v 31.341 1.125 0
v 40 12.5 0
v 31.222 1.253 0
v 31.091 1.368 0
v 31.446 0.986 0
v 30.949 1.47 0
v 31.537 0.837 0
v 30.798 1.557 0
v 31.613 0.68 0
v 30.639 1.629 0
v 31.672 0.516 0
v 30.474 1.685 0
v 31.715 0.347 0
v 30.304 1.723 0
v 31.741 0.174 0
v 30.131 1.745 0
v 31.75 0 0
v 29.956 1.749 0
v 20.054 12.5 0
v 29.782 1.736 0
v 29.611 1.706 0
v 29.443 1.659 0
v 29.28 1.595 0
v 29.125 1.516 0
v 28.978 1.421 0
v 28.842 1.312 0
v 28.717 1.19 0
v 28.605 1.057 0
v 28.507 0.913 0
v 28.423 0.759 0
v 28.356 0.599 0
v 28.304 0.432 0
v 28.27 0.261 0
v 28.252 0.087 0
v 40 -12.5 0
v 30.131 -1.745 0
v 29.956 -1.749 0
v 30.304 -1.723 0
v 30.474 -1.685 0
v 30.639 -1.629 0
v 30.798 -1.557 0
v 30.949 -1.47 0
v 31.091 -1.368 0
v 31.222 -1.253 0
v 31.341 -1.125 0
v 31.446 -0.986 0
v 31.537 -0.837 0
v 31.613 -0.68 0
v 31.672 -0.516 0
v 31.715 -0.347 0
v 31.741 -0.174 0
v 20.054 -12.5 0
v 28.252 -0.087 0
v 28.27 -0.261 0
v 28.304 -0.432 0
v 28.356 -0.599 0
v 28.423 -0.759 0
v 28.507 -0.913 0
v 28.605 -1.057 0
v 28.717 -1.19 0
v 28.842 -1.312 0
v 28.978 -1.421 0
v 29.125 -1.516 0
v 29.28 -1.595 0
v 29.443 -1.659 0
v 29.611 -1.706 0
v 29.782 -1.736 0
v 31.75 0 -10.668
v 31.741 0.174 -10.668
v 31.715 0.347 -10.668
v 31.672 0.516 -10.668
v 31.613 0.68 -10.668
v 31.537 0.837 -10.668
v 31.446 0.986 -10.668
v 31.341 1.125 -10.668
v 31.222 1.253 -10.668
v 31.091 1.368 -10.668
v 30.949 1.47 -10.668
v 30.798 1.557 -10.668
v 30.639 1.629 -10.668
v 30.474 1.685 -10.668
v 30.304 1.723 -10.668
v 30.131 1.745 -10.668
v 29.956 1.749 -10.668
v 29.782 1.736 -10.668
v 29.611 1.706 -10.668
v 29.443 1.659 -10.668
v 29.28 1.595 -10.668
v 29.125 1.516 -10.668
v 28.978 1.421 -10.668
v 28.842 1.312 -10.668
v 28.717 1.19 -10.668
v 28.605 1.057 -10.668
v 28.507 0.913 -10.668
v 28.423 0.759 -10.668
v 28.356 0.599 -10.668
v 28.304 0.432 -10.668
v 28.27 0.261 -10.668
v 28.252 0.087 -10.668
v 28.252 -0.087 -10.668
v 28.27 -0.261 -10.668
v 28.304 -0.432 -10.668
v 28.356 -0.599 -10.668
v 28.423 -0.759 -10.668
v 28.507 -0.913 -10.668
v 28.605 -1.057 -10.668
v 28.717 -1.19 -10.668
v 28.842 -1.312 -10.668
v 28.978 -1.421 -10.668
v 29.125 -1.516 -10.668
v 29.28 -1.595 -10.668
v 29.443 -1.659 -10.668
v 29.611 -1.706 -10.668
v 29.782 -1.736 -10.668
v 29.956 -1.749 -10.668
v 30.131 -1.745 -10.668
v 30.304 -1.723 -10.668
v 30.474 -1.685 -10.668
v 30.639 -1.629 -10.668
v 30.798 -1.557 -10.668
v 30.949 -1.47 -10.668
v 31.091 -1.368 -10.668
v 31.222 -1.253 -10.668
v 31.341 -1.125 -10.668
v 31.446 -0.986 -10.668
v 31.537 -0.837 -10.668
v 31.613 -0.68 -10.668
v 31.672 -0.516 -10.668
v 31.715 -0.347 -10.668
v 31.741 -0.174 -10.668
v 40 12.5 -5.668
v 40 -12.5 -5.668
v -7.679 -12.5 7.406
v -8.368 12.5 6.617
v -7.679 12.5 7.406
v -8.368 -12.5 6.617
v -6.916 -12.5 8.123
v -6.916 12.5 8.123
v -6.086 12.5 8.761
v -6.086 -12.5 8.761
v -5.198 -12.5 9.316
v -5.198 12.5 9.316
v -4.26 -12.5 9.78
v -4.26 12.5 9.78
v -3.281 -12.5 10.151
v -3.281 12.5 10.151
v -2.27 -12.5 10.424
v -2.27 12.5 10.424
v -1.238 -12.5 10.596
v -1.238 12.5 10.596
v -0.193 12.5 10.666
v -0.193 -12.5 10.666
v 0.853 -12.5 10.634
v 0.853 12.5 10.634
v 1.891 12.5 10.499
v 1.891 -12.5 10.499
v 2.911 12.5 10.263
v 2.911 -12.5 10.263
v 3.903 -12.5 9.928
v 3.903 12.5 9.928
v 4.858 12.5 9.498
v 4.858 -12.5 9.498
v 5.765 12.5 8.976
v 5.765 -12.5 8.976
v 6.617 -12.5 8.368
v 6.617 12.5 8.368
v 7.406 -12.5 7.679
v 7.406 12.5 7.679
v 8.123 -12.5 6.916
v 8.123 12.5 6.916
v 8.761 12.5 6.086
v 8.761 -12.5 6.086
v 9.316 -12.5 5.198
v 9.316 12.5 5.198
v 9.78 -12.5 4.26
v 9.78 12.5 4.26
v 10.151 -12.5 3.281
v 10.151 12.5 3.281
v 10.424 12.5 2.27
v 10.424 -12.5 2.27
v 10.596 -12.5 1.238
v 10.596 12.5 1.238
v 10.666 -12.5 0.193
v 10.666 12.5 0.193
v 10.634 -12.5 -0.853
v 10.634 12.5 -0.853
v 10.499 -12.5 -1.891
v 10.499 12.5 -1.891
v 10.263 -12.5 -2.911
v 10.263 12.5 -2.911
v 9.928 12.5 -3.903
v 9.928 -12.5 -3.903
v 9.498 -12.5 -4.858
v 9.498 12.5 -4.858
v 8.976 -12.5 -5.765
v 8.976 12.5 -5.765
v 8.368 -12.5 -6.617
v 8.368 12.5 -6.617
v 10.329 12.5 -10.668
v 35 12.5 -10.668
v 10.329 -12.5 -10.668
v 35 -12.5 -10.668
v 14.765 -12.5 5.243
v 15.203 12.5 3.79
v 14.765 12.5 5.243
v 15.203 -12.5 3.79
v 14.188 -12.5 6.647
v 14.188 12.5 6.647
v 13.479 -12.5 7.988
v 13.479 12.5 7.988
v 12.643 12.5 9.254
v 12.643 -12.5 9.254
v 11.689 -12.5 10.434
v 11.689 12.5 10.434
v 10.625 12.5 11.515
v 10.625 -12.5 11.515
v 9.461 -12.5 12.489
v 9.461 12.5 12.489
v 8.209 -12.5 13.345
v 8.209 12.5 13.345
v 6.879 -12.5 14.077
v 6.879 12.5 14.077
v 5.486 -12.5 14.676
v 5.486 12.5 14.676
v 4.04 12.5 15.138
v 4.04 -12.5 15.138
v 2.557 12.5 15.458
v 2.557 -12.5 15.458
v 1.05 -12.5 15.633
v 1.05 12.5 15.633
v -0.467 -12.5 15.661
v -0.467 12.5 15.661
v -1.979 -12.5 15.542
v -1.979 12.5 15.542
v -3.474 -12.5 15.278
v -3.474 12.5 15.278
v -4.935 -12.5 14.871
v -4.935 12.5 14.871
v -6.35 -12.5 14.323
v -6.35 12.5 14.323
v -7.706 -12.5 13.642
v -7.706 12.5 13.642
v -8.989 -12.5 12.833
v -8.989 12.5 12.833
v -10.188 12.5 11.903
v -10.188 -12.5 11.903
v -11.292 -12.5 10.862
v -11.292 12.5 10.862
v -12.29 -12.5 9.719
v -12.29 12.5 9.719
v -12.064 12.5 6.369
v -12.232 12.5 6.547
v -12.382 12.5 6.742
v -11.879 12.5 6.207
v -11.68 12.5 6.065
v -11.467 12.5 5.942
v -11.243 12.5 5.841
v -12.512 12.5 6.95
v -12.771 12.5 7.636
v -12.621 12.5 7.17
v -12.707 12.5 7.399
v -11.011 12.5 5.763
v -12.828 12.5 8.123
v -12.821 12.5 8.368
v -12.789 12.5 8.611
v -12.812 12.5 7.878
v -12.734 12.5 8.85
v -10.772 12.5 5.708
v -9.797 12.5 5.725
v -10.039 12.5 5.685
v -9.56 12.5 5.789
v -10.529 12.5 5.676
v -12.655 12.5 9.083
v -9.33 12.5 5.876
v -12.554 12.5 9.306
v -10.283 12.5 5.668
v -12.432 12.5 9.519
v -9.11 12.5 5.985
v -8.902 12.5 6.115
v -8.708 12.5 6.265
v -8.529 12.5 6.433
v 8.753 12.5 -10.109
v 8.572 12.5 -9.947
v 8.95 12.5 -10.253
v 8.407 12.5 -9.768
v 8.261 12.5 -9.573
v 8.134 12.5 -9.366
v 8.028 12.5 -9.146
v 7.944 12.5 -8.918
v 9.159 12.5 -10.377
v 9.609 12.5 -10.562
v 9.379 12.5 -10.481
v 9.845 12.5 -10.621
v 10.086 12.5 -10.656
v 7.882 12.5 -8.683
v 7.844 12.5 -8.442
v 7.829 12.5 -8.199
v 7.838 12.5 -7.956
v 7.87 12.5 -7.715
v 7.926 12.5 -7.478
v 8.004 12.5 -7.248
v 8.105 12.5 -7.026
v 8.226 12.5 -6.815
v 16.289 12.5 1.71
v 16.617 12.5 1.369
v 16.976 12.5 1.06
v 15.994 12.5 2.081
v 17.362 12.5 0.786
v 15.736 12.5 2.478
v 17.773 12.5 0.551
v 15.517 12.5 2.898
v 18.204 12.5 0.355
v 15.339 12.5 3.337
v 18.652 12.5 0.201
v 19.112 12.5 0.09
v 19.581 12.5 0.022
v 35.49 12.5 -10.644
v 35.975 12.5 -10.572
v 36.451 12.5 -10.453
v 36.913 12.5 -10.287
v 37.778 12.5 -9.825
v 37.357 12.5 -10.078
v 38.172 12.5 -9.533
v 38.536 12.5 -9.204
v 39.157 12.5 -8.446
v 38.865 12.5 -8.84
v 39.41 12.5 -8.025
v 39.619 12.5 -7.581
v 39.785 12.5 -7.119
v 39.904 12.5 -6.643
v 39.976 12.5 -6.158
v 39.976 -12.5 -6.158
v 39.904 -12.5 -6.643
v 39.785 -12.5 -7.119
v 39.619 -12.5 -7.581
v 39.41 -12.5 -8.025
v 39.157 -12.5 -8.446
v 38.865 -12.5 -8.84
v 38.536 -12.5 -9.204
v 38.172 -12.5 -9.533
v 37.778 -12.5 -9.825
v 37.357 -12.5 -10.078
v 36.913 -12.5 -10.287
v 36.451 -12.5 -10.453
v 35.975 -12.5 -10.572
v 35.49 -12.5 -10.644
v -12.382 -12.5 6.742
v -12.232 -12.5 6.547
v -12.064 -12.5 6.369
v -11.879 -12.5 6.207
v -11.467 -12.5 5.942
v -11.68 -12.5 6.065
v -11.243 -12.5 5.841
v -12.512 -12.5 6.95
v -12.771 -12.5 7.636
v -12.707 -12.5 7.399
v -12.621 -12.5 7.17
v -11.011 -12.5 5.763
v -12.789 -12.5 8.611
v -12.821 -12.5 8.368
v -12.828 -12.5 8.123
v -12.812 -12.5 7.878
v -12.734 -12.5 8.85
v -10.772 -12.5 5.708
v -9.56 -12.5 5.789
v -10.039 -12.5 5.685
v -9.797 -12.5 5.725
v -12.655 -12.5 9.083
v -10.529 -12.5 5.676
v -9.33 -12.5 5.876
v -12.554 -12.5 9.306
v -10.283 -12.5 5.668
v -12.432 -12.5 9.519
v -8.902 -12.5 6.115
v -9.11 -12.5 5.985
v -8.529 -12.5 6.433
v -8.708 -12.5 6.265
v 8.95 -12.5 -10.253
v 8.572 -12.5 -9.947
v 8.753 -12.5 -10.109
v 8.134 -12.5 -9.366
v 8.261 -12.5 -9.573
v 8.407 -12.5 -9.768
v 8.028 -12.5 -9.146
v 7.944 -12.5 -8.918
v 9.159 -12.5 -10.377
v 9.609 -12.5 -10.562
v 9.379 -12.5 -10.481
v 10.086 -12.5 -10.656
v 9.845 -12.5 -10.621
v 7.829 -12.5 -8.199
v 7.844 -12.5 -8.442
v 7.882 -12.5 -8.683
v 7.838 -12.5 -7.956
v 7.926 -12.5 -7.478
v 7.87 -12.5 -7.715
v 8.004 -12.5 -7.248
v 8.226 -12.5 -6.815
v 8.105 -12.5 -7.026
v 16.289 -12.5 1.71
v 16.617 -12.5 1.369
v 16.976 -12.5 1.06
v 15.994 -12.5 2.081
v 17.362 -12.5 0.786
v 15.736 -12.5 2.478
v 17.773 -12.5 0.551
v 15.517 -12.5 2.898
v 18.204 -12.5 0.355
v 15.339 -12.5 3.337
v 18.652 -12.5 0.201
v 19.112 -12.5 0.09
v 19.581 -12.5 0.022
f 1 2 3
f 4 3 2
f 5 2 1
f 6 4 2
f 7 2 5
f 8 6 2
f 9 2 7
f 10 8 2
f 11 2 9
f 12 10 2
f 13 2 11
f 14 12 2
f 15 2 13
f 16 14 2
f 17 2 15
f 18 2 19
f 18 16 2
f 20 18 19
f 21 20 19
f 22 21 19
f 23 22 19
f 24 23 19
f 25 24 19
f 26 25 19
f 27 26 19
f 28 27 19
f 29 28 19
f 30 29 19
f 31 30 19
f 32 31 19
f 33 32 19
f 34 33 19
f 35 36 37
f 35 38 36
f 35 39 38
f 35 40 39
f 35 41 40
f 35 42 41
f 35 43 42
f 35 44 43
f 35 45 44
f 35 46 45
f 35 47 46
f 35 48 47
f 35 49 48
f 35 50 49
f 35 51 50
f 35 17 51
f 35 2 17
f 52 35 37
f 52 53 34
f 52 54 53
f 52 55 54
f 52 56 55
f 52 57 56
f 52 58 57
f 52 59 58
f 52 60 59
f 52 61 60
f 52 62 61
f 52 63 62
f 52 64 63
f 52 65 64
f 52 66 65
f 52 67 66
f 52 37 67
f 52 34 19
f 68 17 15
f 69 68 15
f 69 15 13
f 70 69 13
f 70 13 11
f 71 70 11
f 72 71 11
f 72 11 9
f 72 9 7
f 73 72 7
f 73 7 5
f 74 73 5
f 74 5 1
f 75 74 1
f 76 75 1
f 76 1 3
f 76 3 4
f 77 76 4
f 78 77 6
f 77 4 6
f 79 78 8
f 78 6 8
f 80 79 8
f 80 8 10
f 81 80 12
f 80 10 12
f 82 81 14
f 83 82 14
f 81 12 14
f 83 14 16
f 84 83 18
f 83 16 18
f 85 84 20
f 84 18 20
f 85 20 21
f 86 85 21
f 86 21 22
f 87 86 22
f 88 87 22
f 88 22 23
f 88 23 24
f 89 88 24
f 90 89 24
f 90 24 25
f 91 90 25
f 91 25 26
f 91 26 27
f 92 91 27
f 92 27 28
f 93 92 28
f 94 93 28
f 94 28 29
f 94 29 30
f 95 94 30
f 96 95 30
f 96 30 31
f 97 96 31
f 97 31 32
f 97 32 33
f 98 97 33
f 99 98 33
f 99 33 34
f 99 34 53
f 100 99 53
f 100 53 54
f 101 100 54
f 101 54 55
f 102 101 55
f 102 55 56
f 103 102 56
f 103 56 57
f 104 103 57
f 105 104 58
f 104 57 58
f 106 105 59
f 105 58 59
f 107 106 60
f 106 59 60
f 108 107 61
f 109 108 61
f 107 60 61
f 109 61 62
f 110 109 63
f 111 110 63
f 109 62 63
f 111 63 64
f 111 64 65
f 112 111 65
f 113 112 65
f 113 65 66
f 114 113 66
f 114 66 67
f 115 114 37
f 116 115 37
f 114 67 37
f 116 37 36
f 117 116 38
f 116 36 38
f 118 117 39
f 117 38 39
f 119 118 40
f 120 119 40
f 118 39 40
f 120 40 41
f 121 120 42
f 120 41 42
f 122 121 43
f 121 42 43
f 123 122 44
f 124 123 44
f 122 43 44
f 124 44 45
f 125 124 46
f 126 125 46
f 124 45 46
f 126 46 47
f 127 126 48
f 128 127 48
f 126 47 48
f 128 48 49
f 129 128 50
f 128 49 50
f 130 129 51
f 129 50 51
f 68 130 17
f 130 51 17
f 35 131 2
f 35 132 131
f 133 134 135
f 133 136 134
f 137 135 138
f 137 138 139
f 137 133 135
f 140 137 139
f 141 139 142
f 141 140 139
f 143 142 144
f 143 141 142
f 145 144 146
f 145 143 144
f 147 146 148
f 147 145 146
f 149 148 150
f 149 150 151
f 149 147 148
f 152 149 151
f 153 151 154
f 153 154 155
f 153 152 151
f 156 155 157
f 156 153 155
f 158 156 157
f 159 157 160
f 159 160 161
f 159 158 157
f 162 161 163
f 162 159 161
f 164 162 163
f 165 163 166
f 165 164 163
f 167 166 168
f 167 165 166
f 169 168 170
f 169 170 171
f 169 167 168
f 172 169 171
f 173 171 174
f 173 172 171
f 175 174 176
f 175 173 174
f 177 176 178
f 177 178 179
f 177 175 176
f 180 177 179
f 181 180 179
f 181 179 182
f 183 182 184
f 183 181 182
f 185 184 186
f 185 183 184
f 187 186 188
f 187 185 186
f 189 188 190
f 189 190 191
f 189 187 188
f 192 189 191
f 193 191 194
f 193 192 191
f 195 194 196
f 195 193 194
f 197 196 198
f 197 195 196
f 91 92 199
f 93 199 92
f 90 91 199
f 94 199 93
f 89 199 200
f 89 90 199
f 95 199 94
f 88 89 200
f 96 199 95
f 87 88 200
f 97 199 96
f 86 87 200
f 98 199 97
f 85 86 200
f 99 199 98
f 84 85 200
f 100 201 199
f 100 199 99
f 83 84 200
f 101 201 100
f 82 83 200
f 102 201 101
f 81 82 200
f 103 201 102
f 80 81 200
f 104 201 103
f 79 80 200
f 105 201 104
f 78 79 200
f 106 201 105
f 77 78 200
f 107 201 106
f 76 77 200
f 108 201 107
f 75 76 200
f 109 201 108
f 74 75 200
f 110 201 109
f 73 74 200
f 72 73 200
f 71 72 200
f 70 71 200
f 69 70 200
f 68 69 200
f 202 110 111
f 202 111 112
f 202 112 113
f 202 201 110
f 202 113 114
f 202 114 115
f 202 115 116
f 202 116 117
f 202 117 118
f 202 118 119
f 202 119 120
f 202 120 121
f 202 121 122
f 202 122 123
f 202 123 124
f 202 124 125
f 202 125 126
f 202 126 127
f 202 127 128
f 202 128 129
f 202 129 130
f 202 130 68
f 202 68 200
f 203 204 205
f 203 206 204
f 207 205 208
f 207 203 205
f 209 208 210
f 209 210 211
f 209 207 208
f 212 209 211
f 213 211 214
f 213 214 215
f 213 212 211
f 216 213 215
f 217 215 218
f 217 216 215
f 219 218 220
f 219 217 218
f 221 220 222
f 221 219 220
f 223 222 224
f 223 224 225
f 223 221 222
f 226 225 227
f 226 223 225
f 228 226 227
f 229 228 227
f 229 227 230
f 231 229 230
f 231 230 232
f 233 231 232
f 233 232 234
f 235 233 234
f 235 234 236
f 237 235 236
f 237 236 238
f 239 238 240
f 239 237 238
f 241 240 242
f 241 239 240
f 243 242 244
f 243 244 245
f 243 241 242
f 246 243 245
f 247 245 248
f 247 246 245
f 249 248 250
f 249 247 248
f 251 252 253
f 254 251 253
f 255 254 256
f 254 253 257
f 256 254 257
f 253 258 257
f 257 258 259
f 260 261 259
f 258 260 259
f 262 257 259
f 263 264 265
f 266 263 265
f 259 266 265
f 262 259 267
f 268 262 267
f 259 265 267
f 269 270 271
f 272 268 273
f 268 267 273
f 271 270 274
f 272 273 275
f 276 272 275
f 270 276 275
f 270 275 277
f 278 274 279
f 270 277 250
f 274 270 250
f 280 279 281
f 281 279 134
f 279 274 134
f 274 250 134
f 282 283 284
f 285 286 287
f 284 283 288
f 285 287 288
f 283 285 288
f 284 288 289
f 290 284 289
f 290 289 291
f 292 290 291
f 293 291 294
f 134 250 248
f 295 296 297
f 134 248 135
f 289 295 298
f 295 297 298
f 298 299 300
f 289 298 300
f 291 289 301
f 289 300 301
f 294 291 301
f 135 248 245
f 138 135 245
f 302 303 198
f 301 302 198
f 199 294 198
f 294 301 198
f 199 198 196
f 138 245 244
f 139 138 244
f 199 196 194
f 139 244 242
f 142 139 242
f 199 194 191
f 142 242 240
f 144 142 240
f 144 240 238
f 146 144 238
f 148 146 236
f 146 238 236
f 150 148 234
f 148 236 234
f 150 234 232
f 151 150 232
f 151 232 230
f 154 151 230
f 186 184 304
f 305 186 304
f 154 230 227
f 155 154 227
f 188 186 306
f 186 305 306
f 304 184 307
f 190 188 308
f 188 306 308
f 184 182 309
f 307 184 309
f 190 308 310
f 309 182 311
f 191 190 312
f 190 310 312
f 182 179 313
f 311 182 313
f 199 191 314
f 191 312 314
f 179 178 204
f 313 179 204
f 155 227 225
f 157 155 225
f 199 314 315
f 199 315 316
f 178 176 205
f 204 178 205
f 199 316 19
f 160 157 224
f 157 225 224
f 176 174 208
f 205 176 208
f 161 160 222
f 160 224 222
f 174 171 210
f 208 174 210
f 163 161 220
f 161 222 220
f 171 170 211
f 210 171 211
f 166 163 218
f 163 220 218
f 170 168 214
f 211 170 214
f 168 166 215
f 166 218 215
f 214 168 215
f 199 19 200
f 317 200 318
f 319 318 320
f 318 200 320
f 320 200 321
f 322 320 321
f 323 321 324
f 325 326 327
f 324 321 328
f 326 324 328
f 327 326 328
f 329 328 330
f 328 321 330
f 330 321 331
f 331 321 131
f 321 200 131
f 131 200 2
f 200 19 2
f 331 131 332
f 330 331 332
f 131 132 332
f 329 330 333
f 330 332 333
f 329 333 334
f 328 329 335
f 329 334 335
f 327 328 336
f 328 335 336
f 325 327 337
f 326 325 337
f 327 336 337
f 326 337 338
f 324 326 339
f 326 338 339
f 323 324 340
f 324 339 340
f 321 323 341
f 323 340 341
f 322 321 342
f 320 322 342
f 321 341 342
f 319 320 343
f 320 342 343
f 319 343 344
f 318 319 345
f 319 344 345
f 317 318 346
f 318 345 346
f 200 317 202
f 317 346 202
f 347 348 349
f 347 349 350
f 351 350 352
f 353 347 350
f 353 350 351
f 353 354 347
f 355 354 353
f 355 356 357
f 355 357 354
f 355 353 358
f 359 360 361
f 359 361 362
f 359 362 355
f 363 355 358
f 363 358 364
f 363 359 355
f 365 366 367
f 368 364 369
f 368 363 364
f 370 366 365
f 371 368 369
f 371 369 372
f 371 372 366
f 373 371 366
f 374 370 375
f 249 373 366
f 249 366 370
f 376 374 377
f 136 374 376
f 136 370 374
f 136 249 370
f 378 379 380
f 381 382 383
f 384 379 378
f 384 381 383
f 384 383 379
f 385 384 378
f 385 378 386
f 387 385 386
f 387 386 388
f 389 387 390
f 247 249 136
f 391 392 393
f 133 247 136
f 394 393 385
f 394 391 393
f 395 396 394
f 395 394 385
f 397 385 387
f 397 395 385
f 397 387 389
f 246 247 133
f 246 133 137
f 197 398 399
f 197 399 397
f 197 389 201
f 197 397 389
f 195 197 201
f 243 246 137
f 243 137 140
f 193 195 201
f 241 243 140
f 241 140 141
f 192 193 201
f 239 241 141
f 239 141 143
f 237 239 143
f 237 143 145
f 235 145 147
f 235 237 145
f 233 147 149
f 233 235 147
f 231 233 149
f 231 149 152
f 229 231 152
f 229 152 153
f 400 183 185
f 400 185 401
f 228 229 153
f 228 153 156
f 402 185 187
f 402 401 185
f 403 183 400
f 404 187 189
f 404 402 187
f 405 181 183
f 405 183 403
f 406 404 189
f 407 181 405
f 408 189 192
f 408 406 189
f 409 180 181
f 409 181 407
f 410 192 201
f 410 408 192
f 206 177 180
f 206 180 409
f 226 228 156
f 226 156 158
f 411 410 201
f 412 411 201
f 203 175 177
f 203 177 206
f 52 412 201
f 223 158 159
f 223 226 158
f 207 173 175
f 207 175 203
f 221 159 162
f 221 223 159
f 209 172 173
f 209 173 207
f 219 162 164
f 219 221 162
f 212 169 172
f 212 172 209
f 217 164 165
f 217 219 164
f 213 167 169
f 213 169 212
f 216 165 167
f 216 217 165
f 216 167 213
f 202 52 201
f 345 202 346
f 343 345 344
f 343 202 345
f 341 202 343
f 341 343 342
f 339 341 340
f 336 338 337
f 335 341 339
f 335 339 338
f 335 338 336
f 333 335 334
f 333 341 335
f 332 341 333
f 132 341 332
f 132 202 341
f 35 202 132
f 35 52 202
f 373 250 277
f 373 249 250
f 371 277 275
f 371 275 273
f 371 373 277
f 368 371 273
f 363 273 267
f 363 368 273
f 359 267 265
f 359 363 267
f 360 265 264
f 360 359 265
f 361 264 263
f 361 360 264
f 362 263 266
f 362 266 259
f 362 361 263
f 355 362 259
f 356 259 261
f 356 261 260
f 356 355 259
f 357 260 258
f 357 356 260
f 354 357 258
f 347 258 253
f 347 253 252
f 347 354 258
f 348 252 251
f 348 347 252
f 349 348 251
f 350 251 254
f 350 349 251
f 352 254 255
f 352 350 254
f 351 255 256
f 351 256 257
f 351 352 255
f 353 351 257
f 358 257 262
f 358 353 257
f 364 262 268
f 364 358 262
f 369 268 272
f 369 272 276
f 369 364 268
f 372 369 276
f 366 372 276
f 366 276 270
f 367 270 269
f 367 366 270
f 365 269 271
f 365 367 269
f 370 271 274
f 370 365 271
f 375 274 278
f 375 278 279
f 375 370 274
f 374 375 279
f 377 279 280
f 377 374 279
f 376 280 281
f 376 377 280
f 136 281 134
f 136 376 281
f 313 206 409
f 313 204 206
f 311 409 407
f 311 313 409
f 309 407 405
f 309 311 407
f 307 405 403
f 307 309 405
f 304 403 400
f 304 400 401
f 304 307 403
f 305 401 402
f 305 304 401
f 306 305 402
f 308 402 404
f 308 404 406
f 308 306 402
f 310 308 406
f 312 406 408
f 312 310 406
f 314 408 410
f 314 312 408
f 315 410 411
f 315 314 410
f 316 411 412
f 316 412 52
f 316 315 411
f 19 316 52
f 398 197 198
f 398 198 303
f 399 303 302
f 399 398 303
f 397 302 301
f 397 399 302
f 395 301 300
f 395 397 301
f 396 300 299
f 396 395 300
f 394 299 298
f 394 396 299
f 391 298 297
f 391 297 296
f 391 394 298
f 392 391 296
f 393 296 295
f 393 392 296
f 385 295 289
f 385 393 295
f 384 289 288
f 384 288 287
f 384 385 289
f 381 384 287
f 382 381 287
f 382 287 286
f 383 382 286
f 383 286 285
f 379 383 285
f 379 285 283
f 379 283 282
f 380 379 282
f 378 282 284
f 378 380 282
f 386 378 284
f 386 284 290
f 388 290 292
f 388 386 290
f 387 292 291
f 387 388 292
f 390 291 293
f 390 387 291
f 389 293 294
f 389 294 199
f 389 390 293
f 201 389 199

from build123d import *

# Parameters (mm, degrees)
F1_DEPTH = 12.5
F2_R     = 5
F3_R     = 1.75
F4_DEPTH = 10.669


with BuildPart() as f1:
    # F0 (on Front) → F1 (new body, symmetric)
    with BuildSketch(Plane.XZ):
        with BuildLine():
            ThreePointArc((-8.367673, 6.617271), (6.617271, 8.367673), (8.367673, -6.617271))
            ThreePointArc((8.367673, -6.617271), (8.078399, -9.257307), (10.328601, -10.668))
            Line((10.328601, -10.668), (40, -10.668))
            Line((40, -10.668), (40, 0))
            Line((40, 0), (15.668, 0))
            ThreePointArc((15.668, 0), (5.144603, 14.7993), (-12.289529, 9.718729))
            ThreePointArc((-12.289529, 9.718729), (-11.87933, 6.207072), (-8.367673, 6.617271))
        make_face()
    extrude(amount=F1_DEPTH, both=True)

    # F2
    f2_edges = [f1.edges().sort_by_distance(p)[0] for p in [
        (15.668, 0, 0),
        (40, 0, -10.668),
    ]]
    fillet(f2_edges, radius=F2_R)

    # F3 (on Top) → F4 (cut, through all)
    with BuildSketch(Plane.XY):
        with Locations((30, 0)):
            Circle(F3_R)
    extrude(amount=-F4_DEPTH, mode=Mode.SUBTRACT)


solid = f1.part
